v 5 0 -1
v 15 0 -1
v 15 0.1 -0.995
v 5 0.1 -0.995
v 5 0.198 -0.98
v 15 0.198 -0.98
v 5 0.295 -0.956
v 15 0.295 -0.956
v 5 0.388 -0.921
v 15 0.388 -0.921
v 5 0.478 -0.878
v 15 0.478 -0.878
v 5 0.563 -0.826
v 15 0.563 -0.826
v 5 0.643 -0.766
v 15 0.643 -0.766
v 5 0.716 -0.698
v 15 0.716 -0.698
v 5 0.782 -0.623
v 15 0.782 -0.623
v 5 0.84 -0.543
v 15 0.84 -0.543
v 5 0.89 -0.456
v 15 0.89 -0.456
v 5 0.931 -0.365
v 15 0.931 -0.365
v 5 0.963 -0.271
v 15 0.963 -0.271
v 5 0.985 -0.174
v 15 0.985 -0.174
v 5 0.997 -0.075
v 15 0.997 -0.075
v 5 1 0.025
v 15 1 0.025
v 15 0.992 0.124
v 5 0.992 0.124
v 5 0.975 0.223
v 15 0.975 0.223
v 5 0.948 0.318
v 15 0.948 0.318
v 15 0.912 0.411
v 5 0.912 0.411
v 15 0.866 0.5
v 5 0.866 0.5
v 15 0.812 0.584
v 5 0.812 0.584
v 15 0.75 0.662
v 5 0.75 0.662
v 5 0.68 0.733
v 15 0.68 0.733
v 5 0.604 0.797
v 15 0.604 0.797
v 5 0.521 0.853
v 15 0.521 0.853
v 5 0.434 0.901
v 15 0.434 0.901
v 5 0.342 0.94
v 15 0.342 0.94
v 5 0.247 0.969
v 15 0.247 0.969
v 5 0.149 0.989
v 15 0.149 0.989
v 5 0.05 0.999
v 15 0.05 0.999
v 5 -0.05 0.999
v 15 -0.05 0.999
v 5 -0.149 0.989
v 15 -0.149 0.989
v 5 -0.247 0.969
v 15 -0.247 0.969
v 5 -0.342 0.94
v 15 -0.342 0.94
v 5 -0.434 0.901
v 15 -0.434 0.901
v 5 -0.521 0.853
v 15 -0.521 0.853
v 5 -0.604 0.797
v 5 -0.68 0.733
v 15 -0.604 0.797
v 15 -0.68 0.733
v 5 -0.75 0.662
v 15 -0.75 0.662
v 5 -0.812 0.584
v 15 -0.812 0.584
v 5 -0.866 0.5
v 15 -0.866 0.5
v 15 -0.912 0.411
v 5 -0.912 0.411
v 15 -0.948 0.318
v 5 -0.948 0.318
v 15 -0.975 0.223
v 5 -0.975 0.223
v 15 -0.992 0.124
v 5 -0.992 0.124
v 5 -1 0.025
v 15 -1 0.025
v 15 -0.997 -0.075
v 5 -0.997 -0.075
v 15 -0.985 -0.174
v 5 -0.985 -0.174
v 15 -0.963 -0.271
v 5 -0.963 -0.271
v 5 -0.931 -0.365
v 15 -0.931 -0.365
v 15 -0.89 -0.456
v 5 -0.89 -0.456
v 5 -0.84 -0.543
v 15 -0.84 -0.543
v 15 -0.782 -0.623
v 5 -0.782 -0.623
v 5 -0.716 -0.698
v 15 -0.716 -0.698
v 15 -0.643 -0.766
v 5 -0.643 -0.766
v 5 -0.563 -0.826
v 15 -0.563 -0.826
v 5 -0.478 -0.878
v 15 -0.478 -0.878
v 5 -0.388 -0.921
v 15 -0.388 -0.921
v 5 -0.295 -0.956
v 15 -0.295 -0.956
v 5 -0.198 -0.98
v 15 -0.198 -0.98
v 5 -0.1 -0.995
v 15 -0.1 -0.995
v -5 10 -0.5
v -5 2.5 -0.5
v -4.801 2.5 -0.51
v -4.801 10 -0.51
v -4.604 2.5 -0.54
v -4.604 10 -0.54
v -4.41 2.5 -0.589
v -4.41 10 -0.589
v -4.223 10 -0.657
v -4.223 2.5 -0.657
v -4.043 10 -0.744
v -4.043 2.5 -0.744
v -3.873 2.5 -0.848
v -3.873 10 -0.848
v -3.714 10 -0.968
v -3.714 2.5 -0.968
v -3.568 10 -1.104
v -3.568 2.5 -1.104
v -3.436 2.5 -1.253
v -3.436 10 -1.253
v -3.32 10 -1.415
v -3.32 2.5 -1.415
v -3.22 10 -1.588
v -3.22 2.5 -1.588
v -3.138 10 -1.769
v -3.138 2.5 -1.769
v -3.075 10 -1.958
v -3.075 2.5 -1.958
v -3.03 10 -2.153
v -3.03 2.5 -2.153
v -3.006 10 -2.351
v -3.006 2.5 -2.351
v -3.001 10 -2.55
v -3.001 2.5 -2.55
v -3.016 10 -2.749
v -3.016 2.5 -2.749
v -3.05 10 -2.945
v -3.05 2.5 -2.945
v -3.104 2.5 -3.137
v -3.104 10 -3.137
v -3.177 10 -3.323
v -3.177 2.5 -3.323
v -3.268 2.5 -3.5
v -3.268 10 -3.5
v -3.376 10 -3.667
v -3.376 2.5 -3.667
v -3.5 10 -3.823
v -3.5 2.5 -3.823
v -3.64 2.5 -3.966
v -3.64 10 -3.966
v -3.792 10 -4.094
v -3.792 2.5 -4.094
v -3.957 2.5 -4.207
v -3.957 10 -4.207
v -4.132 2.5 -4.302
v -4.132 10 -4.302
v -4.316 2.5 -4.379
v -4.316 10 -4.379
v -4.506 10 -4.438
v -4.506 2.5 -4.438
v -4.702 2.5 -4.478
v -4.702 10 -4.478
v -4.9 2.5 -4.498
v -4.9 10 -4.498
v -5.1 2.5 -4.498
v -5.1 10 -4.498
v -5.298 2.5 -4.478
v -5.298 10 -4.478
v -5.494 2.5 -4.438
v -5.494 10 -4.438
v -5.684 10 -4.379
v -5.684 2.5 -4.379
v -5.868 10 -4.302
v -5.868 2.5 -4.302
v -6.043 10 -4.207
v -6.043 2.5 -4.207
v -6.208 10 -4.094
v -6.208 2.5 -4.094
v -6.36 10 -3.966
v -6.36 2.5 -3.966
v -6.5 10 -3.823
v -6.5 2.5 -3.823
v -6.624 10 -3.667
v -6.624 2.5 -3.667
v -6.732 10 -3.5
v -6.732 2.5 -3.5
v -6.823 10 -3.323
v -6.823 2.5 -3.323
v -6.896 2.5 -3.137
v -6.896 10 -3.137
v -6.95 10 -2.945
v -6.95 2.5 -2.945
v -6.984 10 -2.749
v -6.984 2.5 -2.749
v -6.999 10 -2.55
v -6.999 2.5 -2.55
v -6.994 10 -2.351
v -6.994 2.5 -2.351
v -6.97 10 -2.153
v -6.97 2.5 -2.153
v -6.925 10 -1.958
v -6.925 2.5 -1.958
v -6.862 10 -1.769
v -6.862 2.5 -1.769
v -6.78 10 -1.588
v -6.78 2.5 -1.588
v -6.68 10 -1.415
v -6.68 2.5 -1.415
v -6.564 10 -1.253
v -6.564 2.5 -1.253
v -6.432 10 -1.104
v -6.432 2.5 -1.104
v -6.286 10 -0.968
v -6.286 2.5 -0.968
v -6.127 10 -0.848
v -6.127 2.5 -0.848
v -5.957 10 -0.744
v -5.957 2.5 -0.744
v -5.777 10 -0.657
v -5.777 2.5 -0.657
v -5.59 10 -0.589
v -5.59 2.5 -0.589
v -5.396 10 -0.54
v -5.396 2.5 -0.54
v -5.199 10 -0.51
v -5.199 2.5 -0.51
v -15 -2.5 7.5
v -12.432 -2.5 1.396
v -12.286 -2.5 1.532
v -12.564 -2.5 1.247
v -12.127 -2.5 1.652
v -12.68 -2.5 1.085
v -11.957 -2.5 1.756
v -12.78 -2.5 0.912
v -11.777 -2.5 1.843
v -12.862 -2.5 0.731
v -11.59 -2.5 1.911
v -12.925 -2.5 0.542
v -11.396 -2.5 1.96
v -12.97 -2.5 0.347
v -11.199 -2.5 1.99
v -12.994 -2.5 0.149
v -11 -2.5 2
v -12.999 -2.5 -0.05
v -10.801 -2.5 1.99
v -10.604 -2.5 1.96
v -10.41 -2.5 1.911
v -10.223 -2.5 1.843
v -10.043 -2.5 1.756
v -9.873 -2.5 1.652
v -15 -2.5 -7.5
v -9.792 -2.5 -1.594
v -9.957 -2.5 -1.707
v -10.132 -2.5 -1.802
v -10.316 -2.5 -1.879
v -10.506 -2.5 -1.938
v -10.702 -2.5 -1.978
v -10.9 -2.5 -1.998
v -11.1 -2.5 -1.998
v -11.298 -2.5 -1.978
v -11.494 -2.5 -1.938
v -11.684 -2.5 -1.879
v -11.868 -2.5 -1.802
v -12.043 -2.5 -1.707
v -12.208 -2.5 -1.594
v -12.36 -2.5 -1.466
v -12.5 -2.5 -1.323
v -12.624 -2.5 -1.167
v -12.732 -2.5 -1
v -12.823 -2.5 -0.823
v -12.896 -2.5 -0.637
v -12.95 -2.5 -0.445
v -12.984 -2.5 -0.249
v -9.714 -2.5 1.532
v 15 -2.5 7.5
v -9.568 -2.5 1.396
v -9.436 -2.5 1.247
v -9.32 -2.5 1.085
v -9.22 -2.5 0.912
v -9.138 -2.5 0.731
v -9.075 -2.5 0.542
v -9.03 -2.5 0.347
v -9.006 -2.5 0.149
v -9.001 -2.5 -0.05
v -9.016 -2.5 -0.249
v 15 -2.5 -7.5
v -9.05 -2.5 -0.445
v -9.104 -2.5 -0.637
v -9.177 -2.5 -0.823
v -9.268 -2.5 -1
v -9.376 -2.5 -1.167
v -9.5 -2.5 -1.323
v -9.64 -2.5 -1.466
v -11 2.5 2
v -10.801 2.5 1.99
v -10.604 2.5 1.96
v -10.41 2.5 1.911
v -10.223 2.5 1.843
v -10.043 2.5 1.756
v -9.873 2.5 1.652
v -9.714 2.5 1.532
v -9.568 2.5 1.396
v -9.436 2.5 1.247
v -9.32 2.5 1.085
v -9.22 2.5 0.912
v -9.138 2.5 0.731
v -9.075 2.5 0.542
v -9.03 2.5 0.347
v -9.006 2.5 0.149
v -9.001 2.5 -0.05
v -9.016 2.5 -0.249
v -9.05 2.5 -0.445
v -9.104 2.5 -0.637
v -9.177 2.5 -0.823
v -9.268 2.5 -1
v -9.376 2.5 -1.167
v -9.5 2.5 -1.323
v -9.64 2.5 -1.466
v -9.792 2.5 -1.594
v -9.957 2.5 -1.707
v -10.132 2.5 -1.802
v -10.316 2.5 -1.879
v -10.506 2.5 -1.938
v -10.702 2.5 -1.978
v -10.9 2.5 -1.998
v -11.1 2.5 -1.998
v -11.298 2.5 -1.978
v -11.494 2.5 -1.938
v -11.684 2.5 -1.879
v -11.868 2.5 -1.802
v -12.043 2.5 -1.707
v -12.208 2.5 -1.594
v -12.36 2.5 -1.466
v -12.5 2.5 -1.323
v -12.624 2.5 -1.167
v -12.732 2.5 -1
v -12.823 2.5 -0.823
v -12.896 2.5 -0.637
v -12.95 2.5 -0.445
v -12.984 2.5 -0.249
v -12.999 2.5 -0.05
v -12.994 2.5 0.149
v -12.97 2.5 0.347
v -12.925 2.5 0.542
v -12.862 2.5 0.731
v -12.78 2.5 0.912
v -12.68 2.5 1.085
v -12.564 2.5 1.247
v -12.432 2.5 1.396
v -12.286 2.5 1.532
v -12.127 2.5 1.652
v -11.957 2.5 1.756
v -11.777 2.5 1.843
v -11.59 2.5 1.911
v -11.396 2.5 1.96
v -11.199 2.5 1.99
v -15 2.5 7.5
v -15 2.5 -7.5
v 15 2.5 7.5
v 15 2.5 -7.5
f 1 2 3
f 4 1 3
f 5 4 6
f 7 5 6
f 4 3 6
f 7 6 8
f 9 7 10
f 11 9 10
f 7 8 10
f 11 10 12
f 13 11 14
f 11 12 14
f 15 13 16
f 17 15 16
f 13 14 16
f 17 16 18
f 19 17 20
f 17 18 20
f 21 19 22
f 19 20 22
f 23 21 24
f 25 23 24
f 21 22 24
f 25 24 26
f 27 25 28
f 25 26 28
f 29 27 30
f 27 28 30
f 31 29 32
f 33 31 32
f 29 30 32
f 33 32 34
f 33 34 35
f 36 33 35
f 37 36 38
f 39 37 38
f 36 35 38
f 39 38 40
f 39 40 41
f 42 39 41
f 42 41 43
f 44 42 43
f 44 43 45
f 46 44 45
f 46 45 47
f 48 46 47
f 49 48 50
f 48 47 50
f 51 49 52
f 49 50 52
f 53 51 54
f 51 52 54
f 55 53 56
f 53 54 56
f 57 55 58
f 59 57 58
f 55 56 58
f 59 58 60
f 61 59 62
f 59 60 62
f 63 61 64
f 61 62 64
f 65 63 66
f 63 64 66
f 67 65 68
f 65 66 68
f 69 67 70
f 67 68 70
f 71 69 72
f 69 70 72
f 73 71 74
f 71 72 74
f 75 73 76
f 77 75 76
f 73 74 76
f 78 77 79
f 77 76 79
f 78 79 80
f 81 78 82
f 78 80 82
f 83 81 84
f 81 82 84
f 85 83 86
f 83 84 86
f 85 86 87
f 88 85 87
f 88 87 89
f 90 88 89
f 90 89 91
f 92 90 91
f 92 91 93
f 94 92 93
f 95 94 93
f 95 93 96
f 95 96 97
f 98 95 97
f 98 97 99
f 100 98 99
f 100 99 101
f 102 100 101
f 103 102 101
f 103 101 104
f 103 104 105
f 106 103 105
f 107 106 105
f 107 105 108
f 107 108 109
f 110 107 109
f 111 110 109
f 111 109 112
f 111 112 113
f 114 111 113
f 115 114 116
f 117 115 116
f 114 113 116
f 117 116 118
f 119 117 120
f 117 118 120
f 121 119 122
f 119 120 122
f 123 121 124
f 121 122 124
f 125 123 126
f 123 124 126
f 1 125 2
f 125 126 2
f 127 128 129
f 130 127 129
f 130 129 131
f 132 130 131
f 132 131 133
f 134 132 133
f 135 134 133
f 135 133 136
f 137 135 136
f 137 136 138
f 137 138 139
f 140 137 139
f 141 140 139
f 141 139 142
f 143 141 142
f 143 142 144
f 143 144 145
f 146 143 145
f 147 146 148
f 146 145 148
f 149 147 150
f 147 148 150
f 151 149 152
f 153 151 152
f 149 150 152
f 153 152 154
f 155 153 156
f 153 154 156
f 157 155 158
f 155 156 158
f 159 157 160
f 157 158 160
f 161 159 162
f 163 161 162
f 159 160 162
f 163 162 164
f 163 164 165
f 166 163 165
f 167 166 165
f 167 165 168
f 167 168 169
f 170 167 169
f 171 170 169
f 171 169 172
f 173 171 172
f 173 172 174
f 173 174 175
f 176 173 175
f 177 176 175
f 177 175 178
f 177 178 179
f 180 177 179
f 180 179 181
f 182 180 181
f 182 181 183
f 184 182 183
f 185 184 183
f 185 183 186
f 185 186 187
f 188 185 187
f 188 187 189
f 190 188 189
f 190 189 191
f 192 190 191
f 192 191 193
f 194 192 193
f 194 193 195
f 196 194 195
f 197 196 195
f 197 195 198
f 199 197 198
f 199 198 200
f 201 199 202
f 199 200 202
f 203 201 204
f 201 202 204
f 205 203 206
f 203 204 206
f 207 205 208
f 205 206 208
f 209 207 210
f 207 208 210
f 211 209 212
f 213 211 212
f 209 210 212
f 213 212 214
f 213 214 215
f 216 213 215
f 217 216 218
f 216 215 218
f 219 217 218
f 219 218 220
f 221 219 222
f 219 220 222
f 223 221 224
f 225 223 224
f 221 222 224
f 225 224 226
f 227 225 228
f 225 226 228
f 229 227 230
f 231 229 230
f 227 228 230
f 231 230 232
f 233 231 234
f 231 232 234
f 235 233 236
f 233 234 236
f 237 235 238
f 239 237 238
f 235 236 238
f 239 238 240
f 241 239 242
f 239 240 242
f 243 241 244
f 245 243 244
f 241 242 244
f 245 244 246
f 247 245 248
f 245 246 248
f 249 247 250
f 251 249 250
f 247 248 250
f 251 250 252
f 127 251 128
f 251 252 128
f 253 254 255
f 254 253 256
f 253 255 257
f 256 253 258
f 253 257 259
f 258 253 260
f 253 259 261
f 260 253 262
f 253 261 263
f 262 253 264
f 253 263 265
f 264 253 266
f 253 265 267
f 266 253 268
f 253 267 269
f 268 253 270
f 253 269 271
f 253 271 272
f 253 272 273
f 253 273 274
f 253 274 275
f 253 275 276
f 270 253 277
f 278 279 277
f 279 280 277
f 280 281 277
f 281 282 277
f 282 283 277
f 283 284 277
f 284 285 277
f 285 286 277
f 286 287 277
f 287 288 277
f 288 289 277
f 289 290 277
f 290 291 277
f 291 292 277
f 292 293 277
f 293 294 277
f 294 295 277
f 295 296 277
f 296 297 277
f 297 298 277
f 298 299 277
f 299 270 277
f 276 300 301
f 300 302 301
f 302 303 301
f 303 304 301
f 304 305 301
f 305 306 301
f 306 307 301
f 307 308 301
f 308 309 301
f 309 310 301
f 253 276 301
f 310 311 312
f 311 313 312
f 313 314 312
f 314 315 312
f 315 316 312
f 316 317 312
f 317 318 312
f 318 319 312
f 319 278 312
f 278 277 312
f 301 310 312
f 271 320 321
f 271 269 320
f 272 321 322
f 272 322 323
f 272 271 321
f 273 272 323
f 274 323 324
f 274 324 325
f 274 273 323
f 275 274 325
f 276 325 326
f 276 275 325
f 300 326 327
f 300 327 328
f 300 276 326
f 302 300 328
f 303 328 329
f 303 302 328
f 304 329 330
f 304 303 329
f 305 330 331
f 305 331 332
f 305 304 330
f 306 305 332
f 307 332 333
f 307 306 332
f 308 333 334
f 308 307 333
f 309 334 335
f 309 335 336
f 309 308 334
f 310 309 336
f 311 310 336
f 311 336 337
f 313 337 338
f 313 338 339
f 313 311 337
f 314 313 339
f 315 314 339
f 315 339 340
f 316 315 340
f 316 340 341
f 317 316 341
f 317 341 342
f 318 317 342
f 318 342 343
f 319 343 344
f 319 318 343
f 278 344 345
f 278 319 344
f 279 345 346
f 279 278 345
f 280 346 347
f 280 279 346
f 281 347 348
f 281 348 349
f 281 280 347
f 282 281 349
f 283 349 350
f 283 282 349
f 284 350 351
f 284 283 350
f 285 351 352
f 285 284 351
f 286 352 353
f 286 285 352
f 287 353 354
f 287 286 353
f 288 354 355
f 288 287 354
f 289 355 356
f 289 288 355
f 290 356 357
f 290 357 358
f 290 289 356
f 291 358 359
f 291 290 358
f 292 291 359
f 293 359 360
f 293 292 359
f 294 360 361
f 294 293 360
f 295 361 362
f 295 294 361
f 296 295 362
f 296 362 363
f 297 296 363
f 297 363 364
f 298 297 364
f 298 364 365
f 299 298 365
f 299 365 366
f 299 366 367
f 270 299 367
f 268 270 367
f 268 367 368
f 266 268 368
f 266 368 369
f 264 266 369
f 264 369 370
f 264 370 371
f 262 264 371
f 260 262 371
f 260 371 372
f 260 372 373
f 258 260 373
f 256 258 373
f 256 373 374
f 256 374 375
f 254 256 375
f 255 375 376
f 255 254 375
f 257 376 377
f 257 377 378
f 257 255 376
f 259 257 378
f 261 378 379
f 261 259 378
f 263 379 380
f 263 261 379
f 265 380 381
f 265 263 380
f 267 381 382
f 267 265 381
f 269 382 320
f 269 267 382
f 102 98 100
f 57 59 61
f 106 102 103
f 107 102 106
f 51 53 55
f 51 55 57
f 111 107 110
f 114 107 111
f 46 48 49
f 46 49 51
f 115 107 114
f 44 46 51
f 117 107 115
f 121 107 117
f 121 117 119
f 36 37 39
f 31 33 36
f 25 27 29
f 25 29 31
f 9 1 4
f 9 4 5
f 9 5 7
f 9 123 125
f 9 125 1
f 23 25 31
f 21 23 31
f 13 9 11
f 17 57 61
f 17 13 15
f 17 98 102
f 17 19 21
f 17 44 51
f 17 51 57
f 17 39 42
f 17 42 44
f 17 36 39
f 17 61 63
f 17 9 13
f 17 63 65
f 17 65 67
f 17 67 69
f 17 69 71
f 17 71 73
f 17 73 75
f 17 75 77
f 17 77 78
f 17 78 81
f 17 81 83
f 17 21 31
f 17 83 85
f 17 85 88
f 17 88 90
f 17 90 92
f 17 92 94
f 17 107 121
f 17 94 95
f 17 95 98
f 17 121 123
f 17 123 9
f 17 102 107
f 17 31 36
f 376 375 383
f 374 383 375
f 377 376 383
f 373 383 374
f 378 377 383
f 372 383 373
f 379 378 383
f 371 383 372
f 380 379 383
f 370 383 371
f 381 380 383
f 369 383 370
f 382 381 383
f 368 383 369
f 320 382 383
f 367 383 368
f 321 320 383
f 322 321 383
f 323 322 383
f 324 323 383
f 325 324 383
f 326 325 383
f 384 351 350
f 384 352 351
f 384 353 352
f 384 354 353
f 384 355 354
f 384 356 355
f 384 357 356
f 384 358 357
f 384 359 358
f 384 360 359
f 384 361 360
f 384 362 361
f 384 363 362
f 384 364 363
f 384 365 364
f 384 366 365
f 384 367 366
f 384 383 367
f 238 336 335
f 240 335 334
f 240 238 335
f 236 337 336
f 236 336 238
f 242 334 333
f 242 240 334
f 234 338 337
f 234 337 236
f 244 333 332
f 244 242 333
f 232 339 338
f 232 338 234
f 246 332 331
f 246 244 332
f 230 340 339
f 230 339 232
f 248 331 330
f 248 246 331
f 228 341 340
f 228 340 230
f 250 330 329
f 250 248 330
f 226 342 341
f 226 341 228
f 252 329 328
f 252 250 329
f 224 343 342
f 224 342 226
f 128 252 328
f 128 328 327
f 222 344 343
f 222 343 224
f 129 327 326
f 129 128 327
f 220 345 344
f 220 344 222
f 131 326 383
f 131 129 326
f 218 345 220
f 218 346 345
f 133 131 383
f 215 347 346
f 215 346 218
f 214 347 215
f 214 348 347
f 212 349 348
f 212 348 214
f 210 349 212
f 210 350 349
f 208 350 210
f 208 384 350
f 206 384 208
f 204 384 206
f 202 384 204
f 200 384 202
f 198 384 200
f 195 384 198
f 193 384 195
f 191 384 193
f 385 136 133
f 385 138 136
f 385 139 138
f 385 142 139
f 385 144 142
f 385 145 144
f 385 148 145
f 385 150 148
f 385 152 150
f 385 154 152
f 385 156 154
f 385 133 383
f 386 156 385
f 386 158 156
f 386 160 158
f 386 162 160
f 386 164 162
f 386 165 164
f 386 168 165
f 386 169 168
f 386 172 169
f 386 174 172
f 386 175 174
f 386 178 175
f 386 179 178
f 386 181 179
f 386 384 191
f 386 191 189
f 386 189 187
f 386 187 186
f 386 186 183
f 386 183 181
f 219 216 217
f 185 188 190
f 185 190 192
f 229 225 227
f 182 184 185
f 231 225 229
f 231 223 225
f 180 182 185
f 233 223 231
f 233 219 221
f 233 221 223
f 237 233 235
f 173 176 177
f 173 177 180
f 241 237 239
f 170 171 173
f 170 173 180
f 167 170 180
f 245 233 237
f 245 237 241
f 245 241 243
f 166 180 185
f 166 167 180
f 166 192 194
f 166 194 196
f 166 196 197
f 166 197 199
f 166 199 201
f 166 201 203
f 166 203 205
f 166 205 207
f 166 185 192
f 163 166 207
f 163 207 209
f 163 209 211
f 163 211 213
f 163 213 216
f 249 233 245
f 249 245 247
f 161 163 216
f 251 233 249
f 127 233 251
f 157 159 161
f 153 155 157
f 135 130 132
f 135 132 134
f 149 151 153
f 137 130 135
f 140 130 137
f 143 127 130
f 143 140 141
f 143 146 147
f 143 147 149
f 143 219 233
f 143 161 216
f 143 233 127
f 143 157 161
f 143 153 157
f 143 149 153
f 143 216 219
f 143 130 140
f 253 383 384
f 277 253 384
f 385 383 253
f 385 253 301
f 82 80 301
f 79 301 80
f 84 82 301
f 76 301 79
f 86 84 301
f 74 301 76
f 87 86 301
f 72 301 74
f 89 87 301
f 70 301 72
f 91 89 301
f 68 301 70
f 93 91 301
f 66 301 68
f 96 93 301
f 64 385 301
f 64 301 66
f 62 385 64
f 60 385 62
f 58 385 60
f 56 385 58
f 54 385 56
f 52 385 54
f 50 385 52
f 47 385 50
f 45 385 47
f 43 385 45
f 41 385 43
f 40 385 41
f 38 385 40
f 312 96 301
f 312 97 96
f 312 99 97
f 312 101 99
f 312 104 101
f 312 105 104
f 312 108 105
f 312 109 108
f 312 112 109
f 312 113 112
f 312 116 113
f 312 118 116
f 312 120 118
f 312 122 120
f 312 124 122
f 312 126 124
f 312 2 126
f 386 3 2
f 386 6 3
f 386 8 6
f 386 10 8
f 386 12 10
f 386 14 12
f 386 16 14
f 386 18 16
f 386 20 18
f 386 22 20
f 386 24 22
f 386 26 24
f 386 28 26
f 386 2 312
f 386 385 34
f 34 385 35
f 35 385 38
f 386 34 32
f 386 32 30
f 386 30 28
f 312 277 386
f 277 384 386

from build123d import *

# Parameters (mm, degrees)
SKETCH1_W                = 30
SKETCH1_H                = 15
SKETCH1_R                = 2
BOSS_EXTRUDE1_DEPTH      = 2.5
BOSS_EXTRUDE2_DEPTH      = 10
BOSS_EXTRUDE2_DEPTH_BACK = 2.5
SKETCH1_3_R              = 2
SKETCH2_R                = 1
CUT_EXTRUDE1_DEPTH       = 10


with BuildPart() as part:
    # Sketch1 → Boss-Extrude1 (new, symmetric)
    with BuildSketch(Plane(origin=(0, 0, 0), x_dir=(1, 0, 0), z_dir=(0, 1, 0))):
        Rectangle(SKETCH1_W, SKETCH1_H)
        with Locations((-11, 0)):
            Circle(SKETCH1_R, mode=Mode.SUBTRACT)
        with Locations((-5, 2.5)):
            Circle(SKETCH1_R, mode=Mode.SUBTRACT)
    extrude(amount=BOSS_EXTRUDE1_DEPTH, both=True)

    # Sketch1<3> → Boss-Extrude2 (add, two sides: drawn at the far end of the back side and taken through both)
    with BuildSketch(Plane(origin=(0, 0, 0), x_dir=(1, 0, 0), z_dir=(0, 1, 0)).offset(-BOSS_EXTRUDE2_DEPTH_BACK)):
        with Locations((-5, 2.5)):
            Circle(SKETCH1_3_R)
    extrude(amount=BOSS_EXTRUDE2_DEPTH + BOSS_EXTRUDE2_DEPTH_BACK)

    # Sketch2 → Cut-Extrude1 (cut)
    with BuildSketch(Plane(origin=(15, 0, 0), x_dir=(0, 0, -1), z_dir=(1, 0, 0))):
        Circle(SKETCH2_R)
    extrude(amount=-CUT_EXTRUDE1_DEPTH, mode=Mode.SUBTRACT)


solid = part.part
